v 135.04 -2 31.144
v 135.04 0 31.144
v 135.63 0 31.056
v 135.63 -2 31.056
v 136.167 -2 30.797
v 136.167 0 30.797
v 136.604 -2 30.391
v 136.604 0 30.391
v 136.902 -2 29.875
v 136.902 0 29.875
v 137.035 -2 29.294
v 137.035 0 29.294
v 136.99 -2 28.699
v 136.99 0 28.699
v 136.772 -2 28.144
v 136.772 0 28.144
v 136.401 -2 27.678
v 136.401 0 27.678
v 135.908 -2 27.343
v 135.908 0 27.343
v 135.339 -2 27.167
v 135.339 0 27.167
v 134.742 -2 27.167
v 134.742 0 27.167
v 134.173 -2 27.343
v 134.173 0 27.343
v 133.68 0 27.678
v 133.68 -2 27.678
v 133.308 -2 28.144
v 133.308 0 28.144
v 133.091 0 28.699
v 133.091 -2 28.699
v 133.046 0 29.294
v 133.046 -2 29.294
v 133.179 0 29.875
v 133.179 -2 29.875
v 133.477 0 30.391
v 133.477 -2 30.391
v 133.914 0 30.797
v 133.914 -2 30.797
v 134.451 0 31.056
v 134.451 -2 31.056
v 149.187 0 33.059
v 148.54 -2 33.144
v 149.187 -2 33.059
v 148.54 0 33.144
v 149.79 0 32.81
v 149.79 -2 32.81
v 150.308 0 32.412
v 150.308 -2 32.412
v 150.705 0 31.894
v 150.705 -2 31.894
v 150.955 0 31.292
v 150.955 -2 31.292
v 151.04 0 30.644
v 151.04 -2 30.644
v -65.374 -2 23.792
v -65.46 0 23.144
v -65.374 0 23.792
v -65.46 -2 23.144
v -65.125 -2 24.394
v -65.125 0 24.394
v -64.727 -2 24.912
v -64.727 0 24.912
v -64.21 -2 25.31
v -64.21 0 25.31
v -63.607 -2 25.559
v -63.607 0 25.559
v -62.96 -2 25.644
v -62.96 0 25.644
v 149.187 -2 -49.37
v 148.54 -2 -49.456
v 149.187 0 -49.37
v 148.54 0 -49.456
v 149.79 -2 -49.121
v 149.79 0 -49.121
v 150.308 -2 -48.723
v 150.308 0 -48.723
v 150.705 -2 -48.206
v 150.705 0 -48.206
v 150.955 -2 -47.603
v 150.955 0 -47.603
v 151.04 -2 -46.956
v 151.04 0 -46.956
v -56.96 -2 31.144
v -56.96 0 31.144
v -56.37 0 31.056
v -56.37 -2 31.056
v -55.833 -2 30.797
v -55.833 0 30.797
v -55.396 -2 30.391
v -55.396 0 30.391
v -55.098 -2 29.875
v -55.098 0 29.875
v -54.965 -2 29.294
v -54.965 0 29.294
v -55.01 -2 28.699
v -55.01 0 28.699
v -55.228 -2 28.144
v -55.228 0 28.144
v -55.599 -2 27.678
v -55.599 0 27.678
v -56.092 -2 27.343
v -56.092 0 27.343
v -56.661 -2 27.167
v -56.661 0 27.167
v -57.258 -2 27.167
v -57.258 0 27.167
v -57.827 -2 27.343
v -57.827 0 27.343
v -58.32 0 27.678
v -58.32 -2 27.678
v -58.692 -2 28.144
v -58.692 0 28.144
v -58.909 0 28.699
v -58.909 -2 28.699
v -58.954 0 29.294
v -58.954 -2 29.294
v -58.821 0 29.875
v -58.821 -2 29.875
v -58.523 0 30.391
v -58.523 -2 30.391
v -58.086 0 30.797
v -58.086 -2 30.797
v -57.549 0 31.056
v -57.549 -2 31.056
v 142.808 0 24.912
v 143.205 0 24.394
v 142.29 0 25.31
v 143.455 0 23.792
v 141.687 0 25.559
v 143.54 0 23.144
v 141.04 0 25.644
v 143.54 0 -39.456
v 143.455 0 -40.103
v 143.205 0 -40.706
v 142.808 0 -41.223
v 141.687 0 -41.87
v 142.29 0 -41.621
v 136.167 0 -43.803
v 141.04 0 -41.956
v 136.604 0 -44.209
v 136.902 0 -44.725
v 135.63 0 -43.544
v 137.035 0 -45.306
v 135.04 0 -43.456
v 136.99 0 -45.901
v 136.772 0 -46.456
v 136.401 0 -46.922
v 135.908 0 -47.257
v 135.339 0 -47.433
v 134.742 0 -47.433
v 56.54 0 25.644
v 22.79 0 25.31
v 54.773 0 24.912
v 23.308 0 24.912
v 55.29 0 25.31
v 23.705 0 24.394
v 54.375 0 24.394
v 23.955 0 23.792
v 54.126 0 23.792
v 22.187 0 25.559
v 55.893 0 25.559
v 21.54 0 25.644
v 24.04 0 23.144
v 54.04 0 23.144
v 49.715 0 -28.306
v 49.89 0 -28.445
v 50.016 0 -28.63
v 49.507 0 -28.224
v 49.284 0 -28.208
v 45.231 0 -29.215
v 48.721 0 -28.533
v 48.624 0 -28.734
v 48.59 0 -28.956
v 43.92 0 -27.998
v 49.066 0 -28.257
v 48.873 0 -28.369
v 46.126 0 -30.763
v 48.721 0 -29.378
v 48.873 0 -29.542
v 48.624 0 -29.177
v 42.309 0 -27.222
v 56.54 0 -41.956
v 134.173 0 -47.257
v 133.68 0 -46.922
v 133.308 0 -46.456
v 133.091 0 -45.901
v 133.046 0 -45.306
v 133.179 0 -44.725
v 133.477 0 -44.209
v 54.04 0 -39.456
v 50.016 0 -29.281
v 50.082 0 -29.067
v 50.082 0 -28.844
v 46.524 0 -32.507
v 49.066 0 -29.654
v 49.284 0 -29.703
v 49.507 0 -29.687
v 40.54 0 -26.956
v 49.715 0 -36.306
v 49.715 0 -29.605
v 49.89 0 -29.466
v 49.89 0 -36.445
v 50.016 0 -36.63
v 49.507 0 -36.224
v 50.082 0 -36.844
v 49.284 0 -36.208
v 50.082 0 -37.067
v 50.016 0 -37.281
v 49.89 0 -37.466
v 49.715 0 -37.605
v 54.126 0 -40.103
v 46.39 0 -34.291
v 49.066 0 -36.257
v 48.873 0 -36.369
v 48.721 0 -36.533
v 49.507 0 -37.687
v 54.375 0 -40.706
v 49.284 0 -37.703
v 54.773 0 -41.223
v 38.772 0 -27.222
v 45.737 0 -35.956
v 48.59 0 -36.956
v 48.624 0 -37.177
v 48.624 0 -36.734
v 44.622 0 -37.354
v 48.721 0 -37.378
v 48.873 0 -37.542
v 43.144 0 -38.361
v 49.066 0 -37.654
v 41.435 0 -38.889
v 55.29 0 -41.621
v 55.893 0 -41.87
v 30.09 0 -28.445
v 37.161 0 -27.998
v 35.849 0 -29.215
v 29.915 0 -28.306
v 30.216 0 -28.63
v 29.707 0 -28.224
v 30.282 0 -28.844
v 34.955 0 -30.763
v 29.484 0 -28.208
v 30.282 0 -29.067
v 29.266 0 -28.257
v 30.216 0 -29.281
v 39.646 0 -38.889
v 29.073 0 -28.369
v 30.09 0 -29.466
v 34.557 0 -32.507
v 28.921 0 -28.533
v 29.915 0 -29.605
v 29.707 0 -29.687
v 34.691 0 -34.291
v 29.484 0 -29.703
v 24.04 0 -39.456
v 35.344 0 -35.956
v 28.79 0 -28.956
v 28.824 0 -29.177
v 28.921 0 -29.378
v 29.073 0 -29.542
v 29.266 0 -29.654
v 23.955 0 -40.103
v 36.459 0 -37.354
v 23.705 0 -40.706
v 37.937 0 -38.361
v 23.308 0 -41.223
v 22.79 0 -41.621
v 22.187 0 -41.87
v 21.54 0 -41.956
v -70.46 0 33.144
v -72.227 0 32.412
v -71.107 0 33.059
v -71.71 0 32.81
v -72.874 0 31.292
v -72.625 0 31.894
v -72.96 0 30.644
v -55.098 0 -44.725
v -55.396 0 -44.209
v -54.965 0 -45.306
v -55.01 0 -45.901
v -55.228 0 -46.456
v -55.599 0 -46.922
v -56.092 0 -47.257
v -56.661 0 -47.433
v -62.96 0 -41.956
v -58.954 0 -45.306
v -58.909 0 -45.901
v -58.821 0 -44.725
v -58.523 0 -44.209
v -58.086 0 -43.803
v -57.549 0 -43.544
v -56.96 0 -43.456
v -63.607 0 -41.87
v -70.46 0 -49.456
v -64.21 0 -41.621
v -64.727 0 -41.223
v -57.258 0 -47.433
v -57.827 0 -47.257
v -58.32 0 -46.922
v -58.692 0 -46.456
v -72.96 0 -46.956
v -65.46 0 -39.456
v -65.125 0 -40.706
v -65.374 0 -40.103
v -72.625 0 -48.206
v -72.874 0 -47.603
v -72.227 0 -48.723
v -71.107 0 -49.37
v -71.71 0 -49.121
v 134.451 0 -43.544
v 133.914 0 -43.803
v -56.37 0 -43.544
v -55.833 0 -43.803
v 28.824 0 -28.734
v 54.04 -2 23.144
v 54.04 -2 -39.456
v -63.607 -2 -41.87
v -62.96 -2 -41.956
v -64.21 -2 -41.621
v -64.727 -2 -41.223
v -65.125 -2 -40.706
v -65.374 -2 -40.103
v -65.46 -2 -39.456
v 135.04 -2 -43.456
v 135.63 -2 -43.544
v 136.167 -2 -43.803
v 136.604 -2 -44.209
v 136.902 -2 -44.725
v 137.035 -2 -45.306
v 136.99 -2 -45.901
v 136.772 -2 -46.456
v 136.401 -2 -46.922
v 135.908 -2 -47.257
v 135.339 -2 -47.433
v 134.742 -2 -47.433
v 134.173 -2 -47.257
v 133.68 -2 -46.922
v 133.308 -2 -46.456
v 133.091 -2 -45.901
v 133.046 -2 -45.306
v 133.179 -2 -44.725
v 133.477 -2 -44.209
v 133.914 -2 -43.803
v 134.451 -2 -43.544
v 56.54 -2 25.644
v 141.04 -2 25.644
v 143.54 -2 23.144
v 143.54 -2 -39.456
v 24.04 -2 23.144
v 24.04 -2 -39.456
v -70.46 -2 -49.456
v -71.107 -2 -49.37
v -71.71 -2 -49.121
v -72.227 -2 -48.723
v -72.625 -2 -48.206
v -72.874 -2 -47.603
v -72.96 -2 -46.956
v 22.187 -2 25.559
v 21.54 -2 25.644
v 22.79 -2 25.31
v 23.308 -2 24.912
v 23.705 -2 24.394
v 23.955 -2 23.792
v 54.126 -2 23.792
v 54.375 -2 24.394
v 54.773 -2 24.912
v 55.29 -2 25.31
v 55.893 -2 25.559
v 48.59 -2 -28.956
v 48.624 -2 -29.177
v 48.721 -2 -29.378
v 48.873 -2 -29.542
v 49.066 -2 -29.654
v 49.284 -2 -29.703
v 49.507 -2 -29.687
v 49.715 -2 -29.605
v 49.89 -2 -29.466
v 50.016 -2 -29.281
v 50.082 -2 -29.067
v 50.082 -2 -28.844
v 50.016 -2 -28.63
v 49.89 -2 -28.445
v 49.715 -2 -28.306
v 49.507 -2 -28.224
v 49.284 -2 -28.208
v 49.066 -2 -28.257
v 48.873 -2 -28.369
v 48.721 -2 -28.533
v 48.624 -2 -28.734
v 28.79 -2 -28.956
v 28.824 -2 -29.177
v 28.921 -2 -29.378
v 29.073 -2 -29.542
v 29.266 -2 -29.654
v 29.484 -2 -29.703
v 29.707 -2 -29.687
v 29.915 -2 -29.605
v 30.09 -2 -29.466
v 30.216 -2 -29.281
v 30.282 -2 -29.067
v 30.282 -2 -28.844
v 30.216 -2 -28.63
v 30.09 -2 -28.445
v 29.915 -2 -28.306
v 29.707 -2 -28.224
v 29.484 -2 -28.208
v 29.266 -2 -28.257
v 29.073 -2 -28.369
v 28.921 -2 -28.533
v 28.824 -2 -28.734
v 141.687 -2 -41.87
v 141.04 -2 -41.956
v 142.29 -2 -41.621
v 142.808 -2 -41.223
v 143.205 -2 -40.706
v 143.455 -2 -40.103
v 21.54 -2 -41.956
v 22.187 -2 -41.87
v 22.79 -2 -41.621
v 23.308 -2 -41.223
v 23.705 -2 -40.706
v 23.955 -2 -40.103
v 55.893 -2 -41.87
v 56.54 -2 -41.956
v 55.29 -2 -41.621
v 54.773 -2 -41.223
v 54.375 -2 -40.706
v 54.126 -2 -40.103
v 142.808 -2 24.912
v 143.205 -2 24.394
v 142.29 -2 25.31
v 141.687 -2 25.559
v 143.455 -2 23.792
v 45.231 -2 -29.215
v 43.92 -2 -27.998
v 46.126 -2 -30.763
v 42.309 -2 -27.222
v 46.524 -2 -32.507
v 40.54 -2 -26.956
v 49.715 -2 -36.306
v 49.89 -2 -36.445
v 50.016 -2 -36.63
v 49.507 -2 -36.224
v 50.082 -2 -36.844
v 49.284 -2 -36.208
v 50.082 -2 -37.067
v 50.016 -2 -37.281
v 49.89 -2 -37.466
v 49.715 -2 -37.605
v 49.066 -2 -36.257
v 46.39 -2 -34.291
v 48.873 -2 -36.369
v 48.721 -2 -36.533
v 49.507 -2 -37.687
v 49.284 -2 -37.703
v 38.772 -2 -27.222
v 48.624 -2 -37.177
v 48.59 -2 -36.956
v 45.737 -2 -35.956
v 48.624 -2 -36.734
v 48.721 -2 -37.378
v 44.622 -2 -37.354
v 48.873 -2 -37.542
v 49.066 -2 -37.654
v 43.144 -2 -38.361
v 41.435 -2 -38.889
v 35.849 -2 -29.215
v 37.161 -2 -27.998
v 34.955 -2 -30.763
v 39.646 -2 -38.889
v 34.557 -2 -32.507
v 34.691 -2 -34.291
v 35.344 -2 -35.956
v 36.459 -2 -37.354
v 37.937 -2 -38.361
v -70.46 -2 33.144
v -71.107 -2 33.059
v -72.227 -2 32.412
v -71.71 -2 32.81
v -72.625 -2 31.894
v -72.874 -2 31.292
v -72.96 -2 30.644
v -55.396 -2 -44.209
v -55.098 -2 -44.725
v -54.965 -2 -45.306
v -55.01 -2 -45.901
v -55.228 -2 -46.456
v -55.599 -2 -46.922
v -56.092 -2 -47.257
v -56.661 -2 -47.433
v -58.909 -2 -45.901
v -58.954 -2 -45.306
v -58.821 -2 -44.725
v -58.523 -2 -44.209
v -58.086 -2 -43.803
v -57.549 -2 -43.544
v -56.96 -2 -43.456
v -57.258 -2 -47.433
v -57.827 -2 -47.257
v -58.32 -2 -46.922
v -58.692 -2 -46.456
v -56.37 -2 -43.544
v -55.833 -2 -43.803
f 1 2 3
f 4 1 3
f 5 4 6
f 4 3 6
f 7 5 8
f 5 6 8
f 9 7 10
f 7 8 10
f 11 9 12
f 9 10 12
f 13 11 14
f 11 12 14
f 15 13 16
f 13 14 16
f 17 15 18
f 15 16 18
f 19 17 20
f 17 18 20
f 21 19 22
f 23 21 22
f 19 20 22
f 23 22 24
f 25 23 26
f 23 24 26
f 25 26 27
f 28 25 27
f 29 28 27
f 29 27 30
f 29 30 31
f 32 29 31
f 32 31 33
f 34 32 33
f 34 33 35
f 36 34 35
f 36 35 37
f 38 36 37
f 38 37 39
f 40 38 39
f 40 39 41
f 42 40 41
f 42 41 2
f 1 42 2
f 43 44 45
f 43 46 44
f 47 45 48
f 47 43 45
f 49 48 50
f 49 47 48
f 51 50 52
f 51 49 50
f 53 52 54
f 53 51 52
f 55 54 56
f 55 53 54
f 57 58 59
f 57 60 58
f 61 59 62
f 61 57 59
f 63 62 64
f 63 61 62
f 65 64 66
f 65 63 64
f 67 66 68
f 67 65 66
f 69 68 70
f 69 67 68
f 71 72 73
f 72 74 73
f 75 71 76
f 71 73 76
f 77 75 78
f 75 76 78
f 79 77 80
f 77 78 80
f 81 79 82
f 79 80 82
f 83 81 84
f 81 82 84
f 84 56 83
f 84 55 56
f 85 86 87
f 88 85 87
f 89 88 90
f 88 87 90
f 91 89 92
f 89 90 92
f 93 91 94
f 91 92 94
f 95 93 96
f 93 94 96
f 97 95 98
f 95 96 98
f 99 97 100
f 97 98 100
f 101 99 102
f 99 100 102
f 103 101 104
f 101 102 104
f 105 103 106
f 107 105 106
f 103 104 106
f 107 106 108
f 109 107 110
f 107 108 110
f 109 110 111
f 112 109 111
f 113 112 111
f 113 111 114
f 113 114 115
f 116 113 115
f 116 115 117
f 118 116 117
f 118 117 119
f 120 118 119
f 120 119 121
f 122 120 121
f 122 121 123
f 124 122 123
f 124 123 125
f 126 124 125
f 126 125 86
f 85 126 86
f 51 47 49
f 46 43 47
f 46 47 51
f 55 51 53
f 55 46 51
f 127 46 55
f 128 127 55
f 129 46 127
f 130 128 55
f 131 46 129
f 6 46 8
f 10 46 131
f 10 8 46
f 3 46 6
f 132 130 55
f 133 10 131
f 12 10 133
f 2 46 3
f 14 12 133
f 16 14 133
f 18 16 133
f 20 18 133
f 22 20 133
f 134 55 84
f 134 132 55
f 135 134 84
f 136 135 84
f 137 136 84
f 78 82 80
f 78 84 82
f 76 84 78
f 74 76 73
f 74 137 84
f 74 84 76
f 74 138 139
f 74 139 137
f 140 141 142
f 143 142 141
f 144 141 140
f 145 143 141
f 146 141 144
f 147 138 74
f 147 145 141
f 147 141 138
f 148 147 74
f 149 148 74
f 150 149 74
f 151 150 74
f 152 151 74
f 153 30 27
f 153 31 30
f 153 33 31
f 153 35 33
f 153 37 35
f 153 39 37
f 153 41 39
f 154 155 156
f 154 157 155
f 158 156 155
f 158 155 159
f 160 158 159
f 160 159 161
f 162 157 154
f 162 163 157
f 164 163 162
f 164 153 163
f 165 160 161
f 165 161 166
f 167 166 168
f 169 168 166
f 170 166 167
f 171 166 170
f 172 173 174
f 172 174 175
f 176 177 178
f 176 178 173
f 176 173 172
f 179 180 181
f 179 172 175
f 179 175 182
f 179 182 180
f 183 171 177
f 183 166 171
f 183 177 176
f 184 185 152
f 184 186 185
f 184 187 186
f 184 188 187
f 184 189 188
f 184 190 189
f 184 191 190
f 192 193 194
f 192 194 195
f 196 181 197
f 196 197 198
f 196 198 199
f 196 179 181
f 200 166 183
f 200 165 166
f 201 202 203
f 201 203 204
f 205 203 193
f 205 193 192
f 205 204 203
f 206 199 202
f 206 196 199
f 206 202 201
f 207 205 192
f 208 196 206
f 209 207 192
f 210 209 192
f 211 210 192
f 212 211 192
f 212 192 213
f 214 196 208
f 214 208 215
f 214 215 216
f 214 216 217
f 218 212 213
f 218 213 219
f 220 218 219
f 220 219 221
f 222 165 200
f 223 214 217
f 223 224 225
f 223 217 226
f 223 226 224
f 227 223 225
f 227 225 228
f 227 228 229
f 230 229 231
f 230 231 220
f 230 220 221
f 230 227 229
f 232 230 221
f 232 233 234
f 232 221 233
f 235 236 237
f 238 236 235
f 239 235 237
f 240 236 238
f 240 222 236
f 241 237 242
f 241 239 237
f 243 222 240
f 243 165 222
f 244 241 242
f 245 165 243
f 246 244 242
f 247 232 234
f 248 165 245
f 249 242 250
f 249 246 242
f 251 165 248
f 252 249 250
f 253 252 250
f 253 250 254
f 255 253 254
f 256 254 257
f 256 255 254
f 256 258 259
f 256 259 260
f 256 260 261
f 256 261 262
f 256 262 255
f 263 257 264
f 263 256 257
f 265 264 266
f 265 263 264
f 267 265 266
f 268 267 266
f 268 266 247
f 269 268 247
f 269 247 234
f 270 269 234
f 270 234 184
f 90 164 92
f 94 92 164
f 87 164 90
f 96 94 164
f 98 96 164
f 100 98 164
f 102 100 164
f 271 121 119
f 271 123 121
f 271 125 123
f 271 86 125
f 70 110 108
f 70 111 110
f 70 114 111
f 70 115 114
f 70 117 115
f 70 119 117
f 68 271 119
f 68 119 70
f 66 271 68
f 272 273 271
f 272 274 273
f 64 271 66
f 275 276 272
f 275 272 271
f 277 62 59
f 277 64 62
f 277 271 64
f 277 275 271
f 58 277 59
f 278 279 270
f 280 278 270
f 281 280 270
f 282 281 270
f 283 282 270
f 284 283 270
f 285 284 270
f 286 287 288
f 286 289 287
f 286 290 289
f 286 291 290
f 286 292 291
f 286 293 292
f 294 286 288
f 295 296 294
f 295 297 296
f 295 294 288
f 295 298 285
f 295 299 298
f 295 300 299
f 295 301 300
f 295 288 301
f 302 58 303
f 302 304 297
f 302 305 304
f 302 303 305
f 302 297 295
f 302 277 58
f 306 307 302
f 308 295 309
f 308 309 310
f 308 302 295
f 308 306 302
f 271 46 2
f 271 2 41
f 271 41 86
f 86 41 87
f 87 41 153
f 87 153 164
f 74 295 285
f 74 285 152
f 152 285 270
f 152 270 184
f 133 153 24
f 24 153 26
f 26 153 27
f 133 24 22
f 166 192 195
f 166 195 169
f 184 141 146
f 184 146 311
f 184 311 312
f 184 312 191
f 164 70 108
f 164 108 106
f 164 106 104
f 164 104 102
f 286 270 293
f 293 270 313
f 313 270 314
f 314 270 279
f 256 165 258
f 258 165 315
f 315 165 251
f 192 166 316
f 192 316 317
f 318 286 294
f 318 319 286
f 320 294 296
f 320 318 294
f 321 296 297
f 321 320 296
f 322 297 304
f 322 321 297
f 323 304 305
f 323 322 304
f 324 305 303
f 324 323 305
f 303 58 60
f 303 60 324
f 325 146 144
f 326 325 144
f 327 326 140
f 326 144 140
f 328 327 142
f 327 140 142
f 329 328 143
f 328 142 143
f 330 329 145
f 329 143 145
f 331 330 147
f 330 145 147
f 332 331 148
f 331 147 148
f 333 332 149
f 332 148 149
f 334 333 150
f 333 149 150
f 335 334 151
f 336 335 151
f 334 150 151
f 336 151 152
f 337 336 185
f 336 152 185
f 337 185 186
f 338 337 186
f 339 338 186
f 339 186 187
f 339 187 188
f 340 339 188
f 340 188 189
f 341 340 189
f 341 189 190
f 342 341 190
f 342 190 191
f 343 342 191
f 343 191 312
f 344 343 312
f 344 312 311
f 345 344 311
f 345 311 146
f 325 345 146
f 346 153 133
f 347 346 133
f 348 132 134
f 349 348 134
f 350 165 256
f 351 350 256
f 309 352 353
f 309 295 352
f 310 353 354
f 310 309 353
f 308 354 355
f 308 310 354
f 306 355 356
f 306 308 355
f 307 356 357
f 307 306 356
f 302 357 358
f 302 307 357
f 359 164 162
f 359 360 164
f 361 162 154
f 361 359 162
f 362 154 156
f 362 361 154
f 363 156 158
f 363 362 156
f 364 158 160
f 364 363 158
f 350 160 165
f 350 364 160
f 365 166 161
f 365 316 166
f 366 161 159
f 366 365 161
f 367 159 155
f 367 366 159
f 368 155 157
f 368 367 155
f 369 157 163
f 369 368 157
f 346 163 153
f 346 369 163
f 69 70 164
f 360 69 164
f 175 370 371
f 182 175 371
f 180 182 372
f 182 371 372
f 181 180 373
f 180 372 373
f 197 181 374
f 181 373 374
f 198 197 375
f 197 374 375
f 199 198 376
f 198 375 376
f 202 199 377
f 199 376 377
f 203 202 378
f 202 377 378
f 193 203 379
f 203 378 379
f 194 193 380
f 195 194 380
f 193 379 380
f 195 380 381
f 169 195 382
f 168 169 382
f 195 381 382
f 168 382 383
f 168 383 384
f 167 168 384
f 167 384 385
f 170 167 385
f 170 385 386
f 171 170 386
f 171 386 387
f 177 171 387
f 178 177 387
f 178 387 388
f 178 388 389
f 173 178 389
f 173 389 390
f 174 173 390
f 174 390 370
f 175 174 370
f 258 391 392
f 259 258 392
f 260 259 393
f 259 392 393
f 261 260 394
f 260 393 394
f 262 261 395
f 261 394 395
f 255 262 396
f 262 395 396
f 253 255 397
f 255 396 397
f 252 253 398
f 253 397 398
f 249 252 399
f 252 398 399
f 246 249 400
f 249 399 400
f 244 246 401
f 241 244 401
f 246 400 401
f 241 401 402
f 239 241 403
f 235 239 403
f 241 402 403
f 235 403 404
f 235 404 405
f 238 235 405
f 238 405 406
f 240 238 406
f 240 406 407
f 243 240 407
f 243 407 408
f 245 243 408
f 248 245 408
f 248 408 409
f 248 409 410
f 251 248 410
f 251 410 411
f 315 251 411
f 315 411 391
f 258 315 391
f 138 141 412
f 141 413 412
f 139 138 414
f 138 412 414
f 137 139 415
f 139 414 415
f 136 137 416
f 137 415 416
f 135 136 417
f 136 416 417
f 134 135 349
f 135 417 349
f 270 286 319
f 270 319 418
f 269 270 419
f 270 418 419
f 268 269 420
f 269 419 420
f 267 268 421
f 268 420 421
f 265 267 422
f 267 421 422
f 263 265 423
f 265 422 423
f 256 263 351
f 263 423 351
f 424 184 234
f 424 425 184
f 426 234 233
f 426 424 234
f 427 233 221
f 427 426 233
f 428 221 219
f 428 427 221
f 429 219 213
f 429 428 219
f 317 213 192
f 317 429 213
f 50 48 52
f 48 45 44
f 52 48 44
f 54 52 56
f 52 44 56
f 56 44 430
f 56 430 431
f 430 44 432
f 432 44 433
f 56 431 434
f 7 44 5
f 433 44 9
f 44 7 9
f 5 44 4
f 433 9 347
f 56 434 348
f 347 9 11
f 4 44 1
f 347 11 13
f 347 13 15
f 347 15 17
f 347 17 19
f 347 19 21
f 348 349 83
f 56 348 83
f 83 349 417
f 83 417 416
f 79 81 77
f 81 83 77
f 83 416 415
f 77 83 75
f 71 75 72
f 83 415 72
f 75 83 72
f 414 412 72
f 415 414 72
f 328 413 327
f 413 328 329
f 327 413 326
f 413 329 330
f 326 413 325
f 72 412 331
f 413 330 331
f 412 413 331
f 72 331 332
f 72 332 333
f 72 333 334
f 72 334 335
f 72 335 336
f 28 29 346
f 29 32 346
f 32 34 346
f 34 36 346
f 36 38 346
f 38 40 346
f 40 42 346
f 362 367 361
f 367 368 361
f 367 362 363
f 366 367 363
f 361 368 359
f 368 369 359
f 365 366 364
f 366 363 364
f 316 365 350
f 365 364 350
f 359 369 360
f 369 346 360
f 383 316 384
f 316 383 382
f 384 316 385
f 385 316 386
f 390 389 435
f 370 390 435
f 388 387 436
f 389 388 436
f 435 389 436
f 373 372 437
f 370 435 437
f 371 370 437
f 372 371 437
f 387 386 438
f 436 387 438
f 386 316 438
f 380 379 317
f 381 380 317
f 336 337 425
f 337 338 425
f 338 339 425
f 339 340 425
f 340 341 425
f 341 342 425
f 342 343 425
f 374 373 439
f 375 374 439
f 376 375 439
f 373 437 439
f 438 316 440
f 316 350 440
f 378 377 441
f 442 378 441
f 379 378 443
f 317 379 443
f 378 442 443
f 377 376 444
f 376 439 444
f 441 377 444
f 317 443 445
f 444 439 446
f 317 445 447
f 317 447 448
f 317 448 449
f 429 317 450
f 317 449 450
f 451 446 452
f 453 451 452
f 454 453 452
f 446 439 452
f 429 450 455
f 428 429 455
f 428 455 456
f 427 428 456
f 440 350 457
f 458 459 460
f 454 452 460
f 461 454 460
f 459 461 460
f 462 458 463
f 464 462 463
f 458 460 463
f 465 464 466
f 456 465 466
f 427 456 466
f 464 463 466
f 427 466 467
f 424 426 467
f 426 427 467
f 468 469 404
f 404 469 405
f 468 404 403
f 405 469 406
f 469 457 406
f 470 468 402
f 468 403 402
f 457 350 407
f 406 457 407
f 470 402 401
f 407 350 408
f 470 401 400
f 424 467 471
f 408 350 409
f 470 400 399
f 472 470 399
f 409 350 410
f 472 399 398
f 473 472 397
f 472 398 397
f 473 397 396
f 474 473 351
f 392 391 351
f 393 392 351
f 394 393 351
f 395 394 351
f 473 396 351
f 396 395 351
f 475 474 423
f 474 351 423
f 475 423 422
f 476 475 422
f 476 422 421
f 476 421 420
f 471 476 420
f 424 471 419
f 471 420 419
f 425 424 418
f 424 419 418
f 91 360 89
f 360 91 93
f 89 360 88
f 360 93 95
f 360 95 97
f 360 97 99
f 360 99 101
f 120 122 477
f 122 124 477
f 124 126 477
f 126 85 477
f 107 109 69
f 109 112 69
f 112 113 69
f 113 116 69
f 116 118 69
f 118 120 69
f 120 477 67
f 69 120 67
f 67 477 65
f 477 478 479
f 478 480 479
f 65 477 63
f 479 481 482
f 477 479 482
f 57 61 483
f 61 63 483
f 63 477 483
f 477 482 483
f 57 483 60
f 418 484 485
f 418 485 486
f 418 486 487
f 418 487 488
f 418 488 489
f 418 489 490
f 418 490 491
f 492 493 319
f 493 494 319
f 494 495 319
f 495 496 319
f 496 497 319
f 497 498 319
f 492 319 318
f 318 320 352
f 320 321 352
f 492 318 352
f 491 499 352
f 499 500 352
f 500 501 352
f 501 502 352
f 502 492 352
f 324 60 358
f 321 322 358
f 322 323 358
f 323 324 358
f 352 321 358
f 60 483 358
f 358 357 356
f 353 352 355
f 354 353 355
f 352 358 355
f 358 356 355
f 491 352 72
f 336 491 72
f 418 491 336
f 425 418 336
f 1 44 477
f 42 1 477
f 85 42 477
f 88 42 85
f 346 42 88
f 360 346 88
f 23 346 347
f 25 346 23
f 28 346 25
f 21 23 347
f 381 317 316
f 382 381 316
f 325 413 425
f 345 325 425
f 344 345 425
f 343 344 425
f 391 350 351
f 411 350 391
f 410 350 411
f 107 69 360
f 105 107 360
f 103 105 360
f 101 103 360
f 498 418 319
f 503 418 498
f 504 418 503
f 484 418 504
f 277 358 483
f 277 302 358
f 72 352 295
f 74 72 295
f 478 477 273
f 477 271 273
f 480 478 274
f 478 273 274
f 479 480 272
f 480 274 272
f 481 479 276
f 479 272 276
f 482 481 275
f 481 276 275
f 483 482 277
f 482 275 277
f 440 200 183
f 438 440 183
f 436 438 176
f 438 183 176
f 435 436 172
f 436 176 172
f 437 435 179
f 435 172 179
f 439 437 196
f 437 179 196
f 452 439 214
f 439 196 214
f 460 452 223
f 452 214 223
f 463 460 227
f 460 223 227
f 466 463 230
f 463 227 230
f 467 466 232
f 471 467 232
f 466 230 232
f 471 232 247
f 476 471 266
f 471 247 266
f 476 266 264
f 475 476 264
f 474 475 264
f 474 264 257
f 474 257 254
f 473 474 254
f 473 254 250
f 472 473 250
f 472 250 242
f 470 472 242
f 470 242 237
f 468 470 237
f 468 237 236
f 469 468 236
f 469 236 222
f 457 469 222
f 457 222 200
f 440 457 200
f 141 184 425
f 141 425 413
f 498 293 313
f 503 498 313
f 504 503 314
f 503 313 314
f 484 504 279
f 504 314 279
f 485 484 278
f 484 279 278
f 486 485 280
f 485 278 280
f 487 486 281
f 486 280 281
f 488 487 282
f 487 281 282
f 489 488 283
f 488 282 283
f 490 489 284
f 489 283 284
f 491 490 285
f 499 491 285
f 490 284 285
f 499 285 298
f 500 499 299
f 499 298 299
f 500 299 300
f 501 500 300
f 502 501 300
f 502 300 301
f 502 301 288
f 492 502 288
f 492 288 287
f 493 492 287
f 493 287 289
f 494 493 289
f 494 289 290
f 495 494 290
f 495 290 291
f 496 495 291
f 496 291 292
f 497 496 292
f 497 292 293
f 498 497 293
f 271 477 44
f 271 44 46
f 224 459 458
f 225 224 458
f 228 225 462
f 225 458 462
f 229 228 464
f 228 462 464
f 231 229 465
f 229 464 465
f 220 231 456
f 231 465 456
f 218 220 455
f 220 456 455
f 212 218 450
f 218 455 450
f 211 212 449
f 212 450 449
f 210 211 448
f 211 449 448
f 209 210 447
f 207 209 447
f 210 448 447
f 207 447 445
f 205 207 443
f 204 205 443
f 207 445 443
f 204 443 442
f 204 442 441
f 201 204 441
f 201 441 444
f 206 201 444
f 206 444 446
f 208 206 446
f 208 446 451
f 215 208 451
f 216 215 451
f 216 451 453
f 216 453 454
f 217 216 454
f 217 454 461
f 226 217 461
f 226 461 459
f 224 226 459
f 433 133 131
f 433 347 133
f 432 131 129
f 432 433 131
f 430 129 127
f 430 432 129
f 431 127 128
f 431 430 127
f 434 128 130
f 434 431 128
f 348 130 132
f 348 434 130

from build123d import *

# Parameters (mm, degrees)
SKETCH1_W             = 200
SKETCH1_H             = 82.6
BASE_FLANGE1_DEPTH    = 2
SKETCH6_R             = 2
CUT_EXTRUDE1_DEPTH    = 148.587569056
SKETCH7_W             = 77.5
SKETCH7_H             = 67.6
CUT_EXTRUDE2_DEPTH    = 148.587569056
SKETCH8_W             = 82.6
SKETCH8_H             = 2
BOSS_EXTRUDE1_DEPTH   = 12
SKETCH9_W             = 82.6
SKETCH9_H             = 2
BOSS_EXTRUDE2_DEPTH   = 12
SKETCH10_W            = 12
SKETCH10_H            = 67.6
CUT_EXTRUDE3_DEPTH    = 159.943577694
FILLET1_R             = 2.5
SKETCH11_R            = 6
CUT_EXTRUDE4_DEPTH    = 159.943577694
F_1_5MM_DOWEL_HOLE1_D = 1.5


# Sheet-metal steps are written as plain solids
with BuildPart() as part:
    # Sketch1 → Base-Flange1 (new body)
    with BuildSketch(Plane(origin=(0, 0, 0), x_dir=(1, 0, 0), z_dir=(0, 1, 0))):
        with Locations((39.040431267, 8.155525606)):
            Rectangle(SKETCH1_W, SKETCH1_H)
    extrude(amount=-BASE_FLANGE1_DEPTH)

    # Sketch6 → Cut-Extrude1 (cut, through all)
    with BuildSketch(Plane(origin=(0, 0, 0), x_dir=(1, 0, 0), z_dir=(0, 1, 0))):
        with Locations(Location((-56.959568733, 45.455525606, 0), (0, 0, 270))):
            Circle(SKETCH6_R)
        with Locations(Location((-56.959568733, -29.144474394, 0), (0, 0, 270))):
            Circle(SKETCH6_R)
        with Locations(Location((135.040431267, -29.144474394, 0), (0, 0, 270))):
            Circle(SKETCH6_R)
        with Locations(Location((135.040431267, 45.455525606, 0), (0, 0, 270))):
            Circle(SKETCH6_R)
    extrude(amount=-CUT_EXTRUDE1_DEPTH, mode=Mode.SUBTRACT)

    # Sketch7 → Cut-Extrude2 (cut, through all)
    with BuildSketch(Plane(origin=(0, 0, 0), x_dir=(1, 0, 0), z_dir=(0, 1, 0))):
        with Locations((-14.709568733, 8.155525606)):
            Rectangle(SKETCH7_W, SKETCH7_H)
        with Locations((92.790431267, 8.155525606)):
            Rectangle(SKETCH7_W, SKETCH7_H)
    extrude(amount=-CUT_EXTRUDE2_DEPTH, mode=Mode.SUBTRACT)

    # Sketch8 → Boss-Extrude1 (add)
    with BuildSketch(Plane.ZY.offset(60.959568733)):
        with Locations((-8.155525606, -1)):
            Rectangle(SKETCH8_W, SKETCH8_H)
    extrude(amount=BOSS_EXTRUDE1_DEPTH)

    # Sketch9 → Boss-Extrude2 (add)
    with BuildSketch(Plane(origin=(139.040431267, 0, 0), x_dir=(0, 0, -1), z_dir=(1, 0, 0))):
        with Locations((8.155525606, -1)):
            Rectangle(SKETCH9_W, SKETCH9_H)
    extrude(amount=BOSS_EXTRUDE2_DEPTH)

    # Sketch10 → Cut-Extrude3 (cut, through all)
    with BuildSketch(Plane(origin=(0, 0, 0), x_dir=(1, 0, 0), z_dir=(0, 1, 0))):
        with Locations((-59.459568733, 8.155525606)):
            Rectangle(SKETCH10_W, SKETCH10_H)
        with Locations((137.540431267, 8.155525606)):
            Rectangle(SKETCH10_W, SKETCH10_H)
    extrude(amount=-CUT_EXTRUDE3_DEPTH, mode=Mode.SUBTRACT)

    # Fillet1
    fillet1_edges = [part.edges().sort_by_distance(p)[0] for p in [
        (-65.459568733, -1, 25.644474394),
        (-65.459568733, -1, -41.955525606),
        (143.540431267, -1, -41.955525606),
        (143.540431267, -1, 25.644474394),
        (24.040431267, -1, -41.955525606),
        (24.040431267, -1, 25.644474394),
        (54.040431267, -1, 25.644474394),
        (54.040431267, -1, -41.955525606),
        (-72.959568733, -1, -49.455525606),
        (-72.959568733, -1, 33.144474394),
        (151.040431267, -1, -49.455525606),
        (151.040431267, -1, 33.144474394),
    ]]
    fillet(fillet1_edges, radius=FILLET1_R)

    # Sketch11 → Cut-Extrude4 (cut, through all)
    with BuildSketch(Plane(origin=(0, 0, 0), x_dir=(1, 0, 0), z_dir=(0, 1, 0))):
        with Locations(Location((40.540479107, 32.955525606, 0), (0, 0, 270))):
            Circle(SKETCH11_R)
    extrude(amount=-CUT_EXTRUDE4_DEPTH, mode=Mode.SUBTRACT)

    # Ø1.5mm Dowel Hole1 (through all)
    with Locations(Plane(origin=(0, 0, 0), x_dir=(1, 0, 0), z_dir=(0, 1, 0))):
        with Locations((49.340479107, 36.955525606), (49.340479107, 28.955525606), (29.540479107, 28.955525606)):
            Hole(F_1_5MM_DOWEL_HOLE1_D / 2)


solid = part.part
